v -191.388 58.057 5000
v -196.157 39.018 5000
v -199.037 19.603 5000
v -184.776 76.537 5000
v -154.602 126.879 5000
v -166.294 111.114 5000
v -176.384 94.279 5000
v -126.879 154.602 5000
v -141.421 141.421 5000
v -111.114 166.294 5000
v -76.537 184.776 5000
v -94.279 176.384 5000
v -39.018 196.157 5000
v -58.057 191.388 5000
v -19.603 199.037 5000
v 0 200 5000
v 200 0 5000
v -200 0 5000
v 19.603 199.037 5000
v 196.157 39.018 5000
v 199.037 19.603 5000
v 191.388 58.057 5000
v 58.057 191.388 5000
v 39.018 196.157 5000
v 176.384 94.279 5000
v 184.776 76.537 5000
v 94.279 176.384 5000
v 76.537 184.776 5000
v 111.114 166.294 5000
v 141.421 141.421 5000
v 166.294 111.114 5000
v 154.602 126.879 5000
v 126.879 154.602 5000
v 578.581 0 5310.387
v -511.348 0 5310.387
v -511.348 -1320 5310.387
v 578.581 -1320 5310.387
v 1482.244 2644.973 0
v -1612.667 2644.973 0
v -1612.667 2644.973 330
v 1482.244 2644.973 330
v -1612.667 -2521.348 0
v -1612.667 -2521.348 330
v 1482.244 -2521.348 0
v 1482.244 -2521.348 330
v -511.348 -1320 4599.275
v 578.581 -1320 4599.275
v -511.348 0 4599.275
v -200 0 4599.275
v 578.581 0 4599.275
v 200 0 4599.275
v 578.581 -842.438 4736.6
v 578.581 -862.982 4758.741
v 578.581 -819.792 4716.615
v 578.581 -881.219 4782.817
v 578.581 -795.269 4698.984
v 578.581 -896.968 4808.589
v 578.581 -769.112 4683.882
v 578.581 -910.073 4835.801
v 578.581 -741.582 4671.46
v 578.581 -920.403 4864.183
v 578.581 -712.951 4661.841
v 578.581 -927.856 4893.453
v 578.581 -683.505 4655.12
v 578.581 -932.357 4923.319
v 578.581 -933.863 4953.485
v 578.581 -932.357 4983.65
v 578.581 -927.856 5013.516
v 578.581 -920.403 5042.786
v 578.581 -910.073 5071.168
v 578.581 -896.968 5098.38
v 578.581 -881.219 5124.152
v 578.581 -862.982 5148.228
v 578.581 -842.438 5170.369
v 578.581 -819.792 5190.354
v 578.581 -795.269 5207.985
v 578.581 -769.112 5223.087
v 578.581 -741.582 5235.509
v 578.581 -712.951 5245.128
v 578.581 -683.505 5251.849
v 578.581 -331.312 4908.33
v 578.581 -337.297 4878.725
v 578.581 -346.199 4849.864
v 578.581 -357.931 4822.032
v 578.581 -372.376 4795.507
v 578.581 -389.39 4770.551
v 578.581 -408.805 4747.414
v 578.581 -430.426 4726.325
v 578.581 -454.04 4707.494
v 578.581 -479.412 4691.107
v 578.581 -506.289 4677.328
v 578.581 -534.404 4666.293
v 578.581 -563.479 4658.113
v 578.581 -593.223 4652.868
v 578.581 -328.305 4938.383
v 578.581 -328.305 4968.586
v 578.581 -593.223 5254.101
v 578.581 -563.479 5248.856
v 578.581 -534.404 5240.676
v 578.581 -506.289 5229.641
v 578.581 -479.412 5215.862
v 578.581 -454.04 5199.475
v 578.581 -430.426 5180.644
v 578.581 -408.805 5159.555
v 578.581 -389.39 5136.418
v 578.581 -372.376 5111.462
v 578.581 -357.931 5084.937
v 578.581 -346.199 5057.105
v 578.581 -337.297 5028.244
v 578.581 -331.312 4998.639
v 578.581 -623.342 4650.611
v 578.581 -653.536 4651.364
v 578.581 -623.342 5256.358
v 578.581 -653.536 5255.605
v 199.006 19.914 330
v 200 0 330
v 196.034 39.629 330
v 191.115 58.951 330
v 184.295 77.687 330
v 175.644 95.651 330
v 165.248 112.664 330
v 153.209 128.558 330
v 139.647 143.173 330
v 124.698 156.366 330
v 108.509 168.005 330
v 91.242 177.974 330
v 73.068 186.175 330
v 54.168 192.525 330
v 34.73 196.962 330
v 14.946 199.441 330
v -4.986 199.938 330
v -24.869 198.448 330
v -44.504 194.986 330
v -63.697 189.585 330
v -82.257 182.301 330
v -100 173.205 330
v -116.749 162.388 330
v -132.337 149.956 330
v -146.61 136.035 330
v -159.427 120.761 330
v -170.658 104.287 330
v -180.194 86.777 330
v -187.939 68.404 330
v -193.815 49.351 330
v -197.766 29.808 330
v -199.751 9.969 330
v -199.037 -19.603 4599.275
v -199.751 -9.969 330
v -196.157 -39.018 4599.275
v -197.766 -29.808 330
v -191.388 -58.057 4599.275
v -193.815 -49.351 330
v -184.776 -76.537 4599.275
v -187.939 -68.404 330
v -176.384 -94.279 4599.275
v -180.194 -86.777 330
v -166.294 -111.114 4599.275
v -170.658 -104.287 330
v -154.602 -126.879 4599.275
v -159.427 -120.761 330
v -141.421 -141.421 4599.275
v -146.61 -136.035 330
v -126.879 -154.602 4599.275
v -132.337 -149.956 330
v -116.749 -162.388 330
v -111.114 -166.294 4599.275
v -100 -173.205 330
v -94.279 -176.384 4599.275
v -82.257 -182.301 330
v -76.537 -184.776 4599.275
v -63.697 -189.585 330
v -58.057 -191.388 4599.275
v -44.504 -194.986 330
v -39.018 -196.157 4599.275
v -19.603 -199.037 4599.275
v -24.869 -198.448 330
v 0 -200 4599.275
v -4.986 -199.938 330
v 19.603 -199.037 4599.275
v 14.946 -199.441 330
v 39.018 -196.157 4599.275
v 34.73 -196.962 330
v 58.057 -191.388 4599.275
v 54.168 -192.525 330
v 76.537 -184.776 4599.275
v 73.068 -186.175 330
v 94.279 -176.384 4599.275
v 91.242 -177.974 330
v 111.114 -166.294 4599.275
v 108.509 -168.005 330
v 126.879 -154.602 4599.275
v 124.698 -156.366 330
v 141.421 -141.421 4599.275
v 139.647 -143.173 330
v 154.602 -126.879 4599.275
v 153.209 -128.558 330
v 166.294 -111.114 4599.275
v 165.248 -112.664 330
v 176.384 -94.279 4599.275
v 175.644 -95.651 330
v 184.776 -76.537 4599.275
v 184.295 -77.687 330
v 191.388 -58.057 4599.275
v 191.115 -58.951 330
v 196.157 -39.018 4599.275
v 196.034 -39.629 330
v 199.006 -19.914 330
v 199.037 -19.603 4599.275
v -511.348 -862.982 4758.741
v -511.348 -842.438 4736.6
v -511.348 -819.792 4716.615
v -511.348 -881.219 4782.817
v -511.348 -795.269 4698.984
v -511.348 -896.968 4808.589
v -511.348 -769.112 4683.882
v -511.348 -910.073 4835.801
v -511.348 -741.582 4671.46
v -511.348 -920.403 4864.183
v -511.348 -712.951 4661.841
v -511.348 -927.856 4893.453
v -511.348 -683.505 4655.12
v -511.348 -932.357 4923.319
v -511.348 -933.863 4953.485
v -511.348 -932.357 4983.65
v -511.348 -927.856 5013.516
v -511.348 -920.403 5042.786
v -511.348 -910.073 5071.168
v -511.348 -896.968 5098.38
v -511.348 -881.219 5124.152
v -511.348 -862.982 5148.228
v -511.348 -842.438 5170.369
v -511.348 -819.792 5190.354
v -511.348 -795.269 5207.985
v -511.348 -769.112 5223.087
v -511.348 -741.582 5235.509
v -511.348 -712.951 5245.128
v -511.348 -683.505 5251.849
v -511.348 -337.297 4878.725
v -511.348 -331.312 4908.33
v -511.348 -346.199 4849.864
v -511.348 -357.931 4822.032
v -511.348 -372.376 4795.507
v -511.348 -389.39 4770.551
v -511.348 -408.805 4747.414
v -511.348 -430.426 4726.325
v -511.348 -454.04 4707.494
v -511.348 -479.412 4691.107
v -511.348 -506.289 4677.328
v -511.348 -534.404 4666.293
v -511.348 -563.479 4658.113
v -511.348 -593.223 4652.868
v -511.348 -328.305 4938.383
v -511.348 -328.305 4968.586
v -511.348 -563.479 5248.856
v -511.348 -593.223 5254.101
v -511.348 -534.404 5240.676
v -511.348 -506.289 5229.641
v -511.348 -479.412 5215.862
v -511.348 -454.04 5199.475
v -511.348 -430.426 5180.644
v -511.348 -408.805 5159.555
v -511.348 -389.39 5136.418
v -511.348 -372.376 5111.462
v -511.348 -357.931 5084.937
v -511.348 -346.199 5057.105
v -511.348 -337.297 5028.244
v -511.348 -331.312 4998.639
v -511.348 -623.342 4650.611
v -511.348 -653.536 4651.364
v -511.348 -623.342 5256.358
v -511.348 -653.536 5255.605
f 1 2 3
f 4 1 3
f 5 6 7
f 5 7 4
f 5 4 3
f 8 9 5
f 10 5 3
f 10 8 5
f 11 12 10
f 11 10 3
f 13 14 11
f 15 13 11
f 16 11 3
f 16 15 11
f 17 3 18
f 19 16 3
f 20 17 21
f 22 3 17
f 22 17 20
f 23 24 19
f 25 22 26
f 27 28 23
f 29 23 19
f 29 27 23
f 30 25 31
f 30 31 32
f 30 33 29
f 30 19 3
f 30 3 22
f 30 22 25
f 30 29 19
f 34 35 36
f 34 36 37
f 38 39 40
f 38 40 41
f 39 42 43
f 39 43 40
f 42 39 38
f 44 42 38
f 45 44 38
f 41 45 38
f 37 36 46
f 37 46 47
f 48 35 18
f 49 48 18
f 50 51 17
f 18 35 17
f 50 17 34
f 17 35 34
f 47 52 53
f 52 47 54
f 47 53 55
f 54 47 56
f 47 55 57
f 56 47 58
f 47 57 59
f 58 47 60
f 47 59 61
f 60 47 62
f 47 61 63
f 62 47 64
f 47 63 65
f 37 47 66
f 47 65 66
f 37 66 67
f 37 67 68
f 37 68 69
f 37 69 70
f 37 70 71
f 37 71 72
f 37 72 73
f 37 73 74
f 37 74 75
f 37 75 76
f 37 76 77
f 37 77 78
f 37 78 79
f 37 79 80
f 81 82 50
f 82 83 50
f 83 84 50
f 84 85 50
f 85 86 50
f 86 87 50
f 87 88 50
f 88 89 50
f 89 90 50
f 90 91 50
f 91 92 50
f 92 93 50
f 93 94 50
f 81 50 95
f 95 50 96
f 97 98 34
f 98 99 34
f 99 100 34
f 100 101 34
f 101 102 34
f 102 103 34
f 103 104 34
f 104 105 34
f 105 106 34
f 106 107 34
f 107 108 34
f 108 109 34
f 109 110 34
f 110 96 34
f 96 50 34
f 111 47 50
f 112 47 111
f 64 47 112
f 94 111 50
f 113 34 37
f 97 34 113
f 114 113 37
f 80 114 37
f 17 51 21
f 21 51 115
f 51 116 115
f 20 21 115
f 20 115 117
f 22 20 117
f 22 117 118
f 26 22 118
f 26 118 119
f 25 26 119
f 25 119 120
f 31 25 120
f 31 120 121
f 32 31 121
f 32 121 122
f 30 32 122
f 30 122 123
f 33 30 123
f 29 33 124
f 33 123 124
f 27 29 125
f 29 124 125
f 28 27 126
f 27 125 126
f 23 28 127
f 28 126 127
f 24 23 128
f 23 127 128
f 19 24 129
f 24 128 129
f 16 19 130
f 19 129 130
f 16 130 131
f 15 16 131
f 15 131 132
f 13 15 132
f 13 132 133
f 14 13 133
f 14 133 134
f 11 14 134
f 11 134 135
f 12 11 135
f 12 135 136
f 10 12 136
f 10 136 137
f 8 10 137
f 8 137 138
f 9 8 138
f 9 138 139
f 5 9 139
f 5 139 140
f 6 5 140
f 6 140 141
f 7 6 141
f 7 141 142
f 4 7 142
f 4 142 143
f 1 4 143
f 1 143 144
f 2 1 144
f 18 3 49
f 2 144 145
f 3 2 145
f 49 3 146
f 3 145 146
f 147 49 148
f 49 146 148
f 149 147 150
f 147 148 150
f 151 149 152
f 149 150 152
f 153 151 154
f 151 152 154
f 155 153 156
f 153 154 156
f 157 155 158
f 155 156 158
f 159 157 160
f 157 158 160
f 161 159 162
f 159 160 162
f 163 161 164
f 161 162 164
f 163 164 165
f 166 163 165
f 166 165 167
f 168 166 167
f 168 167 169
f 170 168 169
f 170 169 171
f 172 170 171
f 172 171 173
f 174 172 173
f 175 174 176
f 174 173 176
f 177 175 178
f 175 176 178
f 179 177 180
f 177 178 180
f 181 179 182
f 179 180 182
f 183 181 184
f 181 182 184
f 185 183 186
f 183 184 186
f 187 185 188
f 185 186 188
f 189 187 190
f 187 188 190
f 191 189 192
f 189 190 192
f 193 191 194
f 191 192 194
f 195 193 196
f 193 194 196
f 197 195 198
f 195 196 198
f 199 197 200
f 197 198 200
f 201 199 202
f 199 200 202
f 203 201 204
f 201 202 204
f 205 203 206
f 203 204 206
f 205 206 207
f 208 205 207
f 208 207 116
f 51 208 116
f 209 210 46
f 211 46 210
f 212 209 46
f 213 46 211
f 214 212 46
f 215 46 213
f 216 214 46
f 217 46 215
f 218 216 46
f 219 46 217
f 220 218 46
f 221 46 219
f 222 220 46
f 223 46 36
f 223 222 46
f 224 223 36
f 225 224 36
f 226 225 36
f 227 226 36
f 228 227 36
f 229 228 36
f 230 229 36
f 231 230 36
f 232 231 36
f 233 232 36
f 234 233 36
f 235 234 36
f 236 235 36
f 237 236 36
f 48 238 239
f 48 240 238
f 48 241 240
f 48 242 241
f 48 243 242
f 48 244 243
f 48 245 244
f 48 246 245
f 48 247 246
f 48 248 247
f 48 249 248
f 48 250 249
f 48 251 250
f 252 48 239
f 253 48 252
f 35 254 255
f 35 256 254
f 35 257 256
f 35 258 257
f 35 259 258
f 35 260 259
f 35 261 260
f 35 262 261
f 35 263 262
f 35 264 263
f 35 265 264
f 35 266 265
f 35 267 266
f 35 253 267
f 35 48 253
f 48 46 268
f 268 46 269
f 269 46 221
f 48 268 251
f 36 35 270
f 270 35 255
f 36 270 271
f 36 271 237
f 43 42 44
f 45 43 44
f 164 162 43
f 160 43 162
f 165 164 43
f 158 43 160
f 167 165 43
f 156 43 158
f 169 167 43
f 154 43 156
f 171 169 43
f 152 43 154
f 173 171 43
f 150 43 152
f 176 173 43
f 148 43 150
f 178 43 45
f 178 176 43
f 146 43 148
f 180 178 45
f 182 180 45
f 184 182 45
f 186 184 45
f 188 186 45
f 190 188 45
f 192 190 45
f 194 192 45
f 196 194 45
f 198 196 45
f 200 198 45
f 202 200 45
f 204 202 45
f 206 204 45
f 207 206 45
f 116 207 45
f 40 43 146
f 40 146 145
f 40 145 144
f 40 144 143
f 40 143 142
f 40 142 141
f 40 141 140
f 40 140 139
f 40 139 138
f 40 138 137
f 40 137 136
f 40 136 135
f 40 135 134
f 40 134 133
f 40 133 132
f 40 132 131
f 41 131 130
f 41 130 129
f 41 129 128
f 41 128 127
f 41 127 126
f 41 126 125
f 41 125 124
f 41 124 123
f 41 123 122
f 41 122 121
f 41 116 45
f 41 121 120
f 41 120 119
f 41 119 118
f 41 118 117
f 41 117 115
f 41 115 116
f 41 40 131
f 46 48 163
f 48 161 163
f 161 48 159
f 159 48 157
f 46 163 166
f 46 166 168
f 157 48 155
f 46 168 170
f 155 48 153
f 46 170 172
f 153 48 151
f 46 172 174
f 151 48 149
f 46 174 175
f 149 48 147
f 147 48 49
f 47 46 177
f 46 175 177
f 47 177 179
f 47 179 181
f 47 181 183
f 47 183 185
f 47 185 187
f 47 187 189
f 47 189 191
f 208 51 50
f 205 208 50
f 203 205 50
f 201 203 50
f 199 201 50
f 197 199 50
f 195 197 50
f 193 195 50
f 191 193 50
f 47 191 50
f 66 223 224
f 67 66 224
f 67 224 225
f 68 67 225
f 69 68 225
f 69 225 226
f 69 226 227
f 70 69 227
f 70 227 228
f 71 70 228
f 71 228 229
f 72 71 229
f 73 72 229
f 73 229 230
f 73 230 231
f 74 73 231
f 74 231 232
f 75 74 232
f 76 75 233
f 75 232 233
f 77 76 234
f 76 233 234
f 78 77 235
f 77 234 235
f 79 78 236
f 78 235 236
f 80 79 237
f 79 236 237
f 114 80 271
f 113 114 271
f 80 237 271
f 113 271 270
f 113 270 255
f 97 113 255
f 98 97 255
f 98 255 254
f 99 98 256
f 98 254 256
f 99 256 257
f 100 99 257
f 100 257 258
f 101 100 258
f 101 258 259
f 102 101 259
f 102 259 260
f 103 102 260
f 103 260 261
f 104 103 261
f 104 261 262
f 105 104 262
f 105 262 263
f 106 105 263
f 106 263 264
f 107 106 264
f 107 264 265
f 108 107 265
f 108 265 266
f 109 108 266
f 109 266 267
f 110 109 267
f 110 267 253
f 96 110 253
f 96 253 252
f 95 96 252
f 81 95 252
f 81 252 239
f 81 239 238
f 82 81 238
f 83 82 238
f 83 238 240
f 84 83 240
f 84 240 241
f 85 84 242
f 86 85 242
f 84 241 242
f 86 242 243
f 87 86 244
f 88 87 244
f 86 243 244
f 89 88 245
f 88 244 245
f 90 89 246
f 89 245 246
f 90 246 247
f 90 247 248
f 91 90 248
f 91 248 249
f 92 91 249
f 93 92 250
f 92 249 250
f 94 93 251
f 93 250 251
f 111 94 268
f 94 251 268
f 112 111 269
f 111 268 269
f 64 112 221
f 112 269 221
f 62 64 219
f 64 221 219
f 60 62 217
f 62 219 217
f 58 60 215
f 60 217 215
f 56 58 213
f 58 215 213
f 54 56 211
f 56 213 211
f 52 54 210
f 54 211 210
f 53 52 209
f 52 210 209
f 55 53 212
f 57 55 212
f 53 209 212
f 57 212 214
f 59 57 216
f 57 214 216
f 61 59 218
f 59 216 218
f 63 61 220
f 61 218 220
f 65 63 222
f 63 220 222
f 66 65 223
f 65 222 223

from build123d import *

# Parameters (mm, degrees)
F0_R     = 200
F1_DEPTH = 5000
F2_W     = 1089.929402
F2_H     = 711.1125
F3_DEPTH = 1320
F4_W     = 3094.910383
F4_H     = 5166.320801
F5_DEPTH = 330
F6_R     = 302.967415
F7_DEPTH = 1990


with BuildPart() as f1:
    # F0 (on Top) → F1 (new body)
    with BuildSketch(Plane.XY):
        Circle(F0_R)
    extrude(amount=F1_DEPTH)

    # F2 (on Front) → F3 (join)
    with BuildSketch(Plane.XZ):
        with Locations((33.616394, 4954.830885)):
            Rectangle(F2_W, F2_H)
    extrude(amount=F3_DEPTH)

    # F4 (on Top) → F5 (join)
    with BuildSketch(Plane.XY):
        with Locations((-65.211415, 61.812639)):
            Rectangle(F4_W, F4_H)
    extrude(amount=F5_DEPTH)

    # F6 (on face) → F7 (cut)
    with BuildSketch(Plane(origin=(-511.348307, 0, 0), x_dir=(0, -1, 0), z_dir=(-1, 0, 0))):
        with Locations((630.895376, 4953.484535)):
            Circle(F6_R)
    extrude(amount=-F7_DEPTH, mode=Mode.SUBTRACT)


solid = f1.part
